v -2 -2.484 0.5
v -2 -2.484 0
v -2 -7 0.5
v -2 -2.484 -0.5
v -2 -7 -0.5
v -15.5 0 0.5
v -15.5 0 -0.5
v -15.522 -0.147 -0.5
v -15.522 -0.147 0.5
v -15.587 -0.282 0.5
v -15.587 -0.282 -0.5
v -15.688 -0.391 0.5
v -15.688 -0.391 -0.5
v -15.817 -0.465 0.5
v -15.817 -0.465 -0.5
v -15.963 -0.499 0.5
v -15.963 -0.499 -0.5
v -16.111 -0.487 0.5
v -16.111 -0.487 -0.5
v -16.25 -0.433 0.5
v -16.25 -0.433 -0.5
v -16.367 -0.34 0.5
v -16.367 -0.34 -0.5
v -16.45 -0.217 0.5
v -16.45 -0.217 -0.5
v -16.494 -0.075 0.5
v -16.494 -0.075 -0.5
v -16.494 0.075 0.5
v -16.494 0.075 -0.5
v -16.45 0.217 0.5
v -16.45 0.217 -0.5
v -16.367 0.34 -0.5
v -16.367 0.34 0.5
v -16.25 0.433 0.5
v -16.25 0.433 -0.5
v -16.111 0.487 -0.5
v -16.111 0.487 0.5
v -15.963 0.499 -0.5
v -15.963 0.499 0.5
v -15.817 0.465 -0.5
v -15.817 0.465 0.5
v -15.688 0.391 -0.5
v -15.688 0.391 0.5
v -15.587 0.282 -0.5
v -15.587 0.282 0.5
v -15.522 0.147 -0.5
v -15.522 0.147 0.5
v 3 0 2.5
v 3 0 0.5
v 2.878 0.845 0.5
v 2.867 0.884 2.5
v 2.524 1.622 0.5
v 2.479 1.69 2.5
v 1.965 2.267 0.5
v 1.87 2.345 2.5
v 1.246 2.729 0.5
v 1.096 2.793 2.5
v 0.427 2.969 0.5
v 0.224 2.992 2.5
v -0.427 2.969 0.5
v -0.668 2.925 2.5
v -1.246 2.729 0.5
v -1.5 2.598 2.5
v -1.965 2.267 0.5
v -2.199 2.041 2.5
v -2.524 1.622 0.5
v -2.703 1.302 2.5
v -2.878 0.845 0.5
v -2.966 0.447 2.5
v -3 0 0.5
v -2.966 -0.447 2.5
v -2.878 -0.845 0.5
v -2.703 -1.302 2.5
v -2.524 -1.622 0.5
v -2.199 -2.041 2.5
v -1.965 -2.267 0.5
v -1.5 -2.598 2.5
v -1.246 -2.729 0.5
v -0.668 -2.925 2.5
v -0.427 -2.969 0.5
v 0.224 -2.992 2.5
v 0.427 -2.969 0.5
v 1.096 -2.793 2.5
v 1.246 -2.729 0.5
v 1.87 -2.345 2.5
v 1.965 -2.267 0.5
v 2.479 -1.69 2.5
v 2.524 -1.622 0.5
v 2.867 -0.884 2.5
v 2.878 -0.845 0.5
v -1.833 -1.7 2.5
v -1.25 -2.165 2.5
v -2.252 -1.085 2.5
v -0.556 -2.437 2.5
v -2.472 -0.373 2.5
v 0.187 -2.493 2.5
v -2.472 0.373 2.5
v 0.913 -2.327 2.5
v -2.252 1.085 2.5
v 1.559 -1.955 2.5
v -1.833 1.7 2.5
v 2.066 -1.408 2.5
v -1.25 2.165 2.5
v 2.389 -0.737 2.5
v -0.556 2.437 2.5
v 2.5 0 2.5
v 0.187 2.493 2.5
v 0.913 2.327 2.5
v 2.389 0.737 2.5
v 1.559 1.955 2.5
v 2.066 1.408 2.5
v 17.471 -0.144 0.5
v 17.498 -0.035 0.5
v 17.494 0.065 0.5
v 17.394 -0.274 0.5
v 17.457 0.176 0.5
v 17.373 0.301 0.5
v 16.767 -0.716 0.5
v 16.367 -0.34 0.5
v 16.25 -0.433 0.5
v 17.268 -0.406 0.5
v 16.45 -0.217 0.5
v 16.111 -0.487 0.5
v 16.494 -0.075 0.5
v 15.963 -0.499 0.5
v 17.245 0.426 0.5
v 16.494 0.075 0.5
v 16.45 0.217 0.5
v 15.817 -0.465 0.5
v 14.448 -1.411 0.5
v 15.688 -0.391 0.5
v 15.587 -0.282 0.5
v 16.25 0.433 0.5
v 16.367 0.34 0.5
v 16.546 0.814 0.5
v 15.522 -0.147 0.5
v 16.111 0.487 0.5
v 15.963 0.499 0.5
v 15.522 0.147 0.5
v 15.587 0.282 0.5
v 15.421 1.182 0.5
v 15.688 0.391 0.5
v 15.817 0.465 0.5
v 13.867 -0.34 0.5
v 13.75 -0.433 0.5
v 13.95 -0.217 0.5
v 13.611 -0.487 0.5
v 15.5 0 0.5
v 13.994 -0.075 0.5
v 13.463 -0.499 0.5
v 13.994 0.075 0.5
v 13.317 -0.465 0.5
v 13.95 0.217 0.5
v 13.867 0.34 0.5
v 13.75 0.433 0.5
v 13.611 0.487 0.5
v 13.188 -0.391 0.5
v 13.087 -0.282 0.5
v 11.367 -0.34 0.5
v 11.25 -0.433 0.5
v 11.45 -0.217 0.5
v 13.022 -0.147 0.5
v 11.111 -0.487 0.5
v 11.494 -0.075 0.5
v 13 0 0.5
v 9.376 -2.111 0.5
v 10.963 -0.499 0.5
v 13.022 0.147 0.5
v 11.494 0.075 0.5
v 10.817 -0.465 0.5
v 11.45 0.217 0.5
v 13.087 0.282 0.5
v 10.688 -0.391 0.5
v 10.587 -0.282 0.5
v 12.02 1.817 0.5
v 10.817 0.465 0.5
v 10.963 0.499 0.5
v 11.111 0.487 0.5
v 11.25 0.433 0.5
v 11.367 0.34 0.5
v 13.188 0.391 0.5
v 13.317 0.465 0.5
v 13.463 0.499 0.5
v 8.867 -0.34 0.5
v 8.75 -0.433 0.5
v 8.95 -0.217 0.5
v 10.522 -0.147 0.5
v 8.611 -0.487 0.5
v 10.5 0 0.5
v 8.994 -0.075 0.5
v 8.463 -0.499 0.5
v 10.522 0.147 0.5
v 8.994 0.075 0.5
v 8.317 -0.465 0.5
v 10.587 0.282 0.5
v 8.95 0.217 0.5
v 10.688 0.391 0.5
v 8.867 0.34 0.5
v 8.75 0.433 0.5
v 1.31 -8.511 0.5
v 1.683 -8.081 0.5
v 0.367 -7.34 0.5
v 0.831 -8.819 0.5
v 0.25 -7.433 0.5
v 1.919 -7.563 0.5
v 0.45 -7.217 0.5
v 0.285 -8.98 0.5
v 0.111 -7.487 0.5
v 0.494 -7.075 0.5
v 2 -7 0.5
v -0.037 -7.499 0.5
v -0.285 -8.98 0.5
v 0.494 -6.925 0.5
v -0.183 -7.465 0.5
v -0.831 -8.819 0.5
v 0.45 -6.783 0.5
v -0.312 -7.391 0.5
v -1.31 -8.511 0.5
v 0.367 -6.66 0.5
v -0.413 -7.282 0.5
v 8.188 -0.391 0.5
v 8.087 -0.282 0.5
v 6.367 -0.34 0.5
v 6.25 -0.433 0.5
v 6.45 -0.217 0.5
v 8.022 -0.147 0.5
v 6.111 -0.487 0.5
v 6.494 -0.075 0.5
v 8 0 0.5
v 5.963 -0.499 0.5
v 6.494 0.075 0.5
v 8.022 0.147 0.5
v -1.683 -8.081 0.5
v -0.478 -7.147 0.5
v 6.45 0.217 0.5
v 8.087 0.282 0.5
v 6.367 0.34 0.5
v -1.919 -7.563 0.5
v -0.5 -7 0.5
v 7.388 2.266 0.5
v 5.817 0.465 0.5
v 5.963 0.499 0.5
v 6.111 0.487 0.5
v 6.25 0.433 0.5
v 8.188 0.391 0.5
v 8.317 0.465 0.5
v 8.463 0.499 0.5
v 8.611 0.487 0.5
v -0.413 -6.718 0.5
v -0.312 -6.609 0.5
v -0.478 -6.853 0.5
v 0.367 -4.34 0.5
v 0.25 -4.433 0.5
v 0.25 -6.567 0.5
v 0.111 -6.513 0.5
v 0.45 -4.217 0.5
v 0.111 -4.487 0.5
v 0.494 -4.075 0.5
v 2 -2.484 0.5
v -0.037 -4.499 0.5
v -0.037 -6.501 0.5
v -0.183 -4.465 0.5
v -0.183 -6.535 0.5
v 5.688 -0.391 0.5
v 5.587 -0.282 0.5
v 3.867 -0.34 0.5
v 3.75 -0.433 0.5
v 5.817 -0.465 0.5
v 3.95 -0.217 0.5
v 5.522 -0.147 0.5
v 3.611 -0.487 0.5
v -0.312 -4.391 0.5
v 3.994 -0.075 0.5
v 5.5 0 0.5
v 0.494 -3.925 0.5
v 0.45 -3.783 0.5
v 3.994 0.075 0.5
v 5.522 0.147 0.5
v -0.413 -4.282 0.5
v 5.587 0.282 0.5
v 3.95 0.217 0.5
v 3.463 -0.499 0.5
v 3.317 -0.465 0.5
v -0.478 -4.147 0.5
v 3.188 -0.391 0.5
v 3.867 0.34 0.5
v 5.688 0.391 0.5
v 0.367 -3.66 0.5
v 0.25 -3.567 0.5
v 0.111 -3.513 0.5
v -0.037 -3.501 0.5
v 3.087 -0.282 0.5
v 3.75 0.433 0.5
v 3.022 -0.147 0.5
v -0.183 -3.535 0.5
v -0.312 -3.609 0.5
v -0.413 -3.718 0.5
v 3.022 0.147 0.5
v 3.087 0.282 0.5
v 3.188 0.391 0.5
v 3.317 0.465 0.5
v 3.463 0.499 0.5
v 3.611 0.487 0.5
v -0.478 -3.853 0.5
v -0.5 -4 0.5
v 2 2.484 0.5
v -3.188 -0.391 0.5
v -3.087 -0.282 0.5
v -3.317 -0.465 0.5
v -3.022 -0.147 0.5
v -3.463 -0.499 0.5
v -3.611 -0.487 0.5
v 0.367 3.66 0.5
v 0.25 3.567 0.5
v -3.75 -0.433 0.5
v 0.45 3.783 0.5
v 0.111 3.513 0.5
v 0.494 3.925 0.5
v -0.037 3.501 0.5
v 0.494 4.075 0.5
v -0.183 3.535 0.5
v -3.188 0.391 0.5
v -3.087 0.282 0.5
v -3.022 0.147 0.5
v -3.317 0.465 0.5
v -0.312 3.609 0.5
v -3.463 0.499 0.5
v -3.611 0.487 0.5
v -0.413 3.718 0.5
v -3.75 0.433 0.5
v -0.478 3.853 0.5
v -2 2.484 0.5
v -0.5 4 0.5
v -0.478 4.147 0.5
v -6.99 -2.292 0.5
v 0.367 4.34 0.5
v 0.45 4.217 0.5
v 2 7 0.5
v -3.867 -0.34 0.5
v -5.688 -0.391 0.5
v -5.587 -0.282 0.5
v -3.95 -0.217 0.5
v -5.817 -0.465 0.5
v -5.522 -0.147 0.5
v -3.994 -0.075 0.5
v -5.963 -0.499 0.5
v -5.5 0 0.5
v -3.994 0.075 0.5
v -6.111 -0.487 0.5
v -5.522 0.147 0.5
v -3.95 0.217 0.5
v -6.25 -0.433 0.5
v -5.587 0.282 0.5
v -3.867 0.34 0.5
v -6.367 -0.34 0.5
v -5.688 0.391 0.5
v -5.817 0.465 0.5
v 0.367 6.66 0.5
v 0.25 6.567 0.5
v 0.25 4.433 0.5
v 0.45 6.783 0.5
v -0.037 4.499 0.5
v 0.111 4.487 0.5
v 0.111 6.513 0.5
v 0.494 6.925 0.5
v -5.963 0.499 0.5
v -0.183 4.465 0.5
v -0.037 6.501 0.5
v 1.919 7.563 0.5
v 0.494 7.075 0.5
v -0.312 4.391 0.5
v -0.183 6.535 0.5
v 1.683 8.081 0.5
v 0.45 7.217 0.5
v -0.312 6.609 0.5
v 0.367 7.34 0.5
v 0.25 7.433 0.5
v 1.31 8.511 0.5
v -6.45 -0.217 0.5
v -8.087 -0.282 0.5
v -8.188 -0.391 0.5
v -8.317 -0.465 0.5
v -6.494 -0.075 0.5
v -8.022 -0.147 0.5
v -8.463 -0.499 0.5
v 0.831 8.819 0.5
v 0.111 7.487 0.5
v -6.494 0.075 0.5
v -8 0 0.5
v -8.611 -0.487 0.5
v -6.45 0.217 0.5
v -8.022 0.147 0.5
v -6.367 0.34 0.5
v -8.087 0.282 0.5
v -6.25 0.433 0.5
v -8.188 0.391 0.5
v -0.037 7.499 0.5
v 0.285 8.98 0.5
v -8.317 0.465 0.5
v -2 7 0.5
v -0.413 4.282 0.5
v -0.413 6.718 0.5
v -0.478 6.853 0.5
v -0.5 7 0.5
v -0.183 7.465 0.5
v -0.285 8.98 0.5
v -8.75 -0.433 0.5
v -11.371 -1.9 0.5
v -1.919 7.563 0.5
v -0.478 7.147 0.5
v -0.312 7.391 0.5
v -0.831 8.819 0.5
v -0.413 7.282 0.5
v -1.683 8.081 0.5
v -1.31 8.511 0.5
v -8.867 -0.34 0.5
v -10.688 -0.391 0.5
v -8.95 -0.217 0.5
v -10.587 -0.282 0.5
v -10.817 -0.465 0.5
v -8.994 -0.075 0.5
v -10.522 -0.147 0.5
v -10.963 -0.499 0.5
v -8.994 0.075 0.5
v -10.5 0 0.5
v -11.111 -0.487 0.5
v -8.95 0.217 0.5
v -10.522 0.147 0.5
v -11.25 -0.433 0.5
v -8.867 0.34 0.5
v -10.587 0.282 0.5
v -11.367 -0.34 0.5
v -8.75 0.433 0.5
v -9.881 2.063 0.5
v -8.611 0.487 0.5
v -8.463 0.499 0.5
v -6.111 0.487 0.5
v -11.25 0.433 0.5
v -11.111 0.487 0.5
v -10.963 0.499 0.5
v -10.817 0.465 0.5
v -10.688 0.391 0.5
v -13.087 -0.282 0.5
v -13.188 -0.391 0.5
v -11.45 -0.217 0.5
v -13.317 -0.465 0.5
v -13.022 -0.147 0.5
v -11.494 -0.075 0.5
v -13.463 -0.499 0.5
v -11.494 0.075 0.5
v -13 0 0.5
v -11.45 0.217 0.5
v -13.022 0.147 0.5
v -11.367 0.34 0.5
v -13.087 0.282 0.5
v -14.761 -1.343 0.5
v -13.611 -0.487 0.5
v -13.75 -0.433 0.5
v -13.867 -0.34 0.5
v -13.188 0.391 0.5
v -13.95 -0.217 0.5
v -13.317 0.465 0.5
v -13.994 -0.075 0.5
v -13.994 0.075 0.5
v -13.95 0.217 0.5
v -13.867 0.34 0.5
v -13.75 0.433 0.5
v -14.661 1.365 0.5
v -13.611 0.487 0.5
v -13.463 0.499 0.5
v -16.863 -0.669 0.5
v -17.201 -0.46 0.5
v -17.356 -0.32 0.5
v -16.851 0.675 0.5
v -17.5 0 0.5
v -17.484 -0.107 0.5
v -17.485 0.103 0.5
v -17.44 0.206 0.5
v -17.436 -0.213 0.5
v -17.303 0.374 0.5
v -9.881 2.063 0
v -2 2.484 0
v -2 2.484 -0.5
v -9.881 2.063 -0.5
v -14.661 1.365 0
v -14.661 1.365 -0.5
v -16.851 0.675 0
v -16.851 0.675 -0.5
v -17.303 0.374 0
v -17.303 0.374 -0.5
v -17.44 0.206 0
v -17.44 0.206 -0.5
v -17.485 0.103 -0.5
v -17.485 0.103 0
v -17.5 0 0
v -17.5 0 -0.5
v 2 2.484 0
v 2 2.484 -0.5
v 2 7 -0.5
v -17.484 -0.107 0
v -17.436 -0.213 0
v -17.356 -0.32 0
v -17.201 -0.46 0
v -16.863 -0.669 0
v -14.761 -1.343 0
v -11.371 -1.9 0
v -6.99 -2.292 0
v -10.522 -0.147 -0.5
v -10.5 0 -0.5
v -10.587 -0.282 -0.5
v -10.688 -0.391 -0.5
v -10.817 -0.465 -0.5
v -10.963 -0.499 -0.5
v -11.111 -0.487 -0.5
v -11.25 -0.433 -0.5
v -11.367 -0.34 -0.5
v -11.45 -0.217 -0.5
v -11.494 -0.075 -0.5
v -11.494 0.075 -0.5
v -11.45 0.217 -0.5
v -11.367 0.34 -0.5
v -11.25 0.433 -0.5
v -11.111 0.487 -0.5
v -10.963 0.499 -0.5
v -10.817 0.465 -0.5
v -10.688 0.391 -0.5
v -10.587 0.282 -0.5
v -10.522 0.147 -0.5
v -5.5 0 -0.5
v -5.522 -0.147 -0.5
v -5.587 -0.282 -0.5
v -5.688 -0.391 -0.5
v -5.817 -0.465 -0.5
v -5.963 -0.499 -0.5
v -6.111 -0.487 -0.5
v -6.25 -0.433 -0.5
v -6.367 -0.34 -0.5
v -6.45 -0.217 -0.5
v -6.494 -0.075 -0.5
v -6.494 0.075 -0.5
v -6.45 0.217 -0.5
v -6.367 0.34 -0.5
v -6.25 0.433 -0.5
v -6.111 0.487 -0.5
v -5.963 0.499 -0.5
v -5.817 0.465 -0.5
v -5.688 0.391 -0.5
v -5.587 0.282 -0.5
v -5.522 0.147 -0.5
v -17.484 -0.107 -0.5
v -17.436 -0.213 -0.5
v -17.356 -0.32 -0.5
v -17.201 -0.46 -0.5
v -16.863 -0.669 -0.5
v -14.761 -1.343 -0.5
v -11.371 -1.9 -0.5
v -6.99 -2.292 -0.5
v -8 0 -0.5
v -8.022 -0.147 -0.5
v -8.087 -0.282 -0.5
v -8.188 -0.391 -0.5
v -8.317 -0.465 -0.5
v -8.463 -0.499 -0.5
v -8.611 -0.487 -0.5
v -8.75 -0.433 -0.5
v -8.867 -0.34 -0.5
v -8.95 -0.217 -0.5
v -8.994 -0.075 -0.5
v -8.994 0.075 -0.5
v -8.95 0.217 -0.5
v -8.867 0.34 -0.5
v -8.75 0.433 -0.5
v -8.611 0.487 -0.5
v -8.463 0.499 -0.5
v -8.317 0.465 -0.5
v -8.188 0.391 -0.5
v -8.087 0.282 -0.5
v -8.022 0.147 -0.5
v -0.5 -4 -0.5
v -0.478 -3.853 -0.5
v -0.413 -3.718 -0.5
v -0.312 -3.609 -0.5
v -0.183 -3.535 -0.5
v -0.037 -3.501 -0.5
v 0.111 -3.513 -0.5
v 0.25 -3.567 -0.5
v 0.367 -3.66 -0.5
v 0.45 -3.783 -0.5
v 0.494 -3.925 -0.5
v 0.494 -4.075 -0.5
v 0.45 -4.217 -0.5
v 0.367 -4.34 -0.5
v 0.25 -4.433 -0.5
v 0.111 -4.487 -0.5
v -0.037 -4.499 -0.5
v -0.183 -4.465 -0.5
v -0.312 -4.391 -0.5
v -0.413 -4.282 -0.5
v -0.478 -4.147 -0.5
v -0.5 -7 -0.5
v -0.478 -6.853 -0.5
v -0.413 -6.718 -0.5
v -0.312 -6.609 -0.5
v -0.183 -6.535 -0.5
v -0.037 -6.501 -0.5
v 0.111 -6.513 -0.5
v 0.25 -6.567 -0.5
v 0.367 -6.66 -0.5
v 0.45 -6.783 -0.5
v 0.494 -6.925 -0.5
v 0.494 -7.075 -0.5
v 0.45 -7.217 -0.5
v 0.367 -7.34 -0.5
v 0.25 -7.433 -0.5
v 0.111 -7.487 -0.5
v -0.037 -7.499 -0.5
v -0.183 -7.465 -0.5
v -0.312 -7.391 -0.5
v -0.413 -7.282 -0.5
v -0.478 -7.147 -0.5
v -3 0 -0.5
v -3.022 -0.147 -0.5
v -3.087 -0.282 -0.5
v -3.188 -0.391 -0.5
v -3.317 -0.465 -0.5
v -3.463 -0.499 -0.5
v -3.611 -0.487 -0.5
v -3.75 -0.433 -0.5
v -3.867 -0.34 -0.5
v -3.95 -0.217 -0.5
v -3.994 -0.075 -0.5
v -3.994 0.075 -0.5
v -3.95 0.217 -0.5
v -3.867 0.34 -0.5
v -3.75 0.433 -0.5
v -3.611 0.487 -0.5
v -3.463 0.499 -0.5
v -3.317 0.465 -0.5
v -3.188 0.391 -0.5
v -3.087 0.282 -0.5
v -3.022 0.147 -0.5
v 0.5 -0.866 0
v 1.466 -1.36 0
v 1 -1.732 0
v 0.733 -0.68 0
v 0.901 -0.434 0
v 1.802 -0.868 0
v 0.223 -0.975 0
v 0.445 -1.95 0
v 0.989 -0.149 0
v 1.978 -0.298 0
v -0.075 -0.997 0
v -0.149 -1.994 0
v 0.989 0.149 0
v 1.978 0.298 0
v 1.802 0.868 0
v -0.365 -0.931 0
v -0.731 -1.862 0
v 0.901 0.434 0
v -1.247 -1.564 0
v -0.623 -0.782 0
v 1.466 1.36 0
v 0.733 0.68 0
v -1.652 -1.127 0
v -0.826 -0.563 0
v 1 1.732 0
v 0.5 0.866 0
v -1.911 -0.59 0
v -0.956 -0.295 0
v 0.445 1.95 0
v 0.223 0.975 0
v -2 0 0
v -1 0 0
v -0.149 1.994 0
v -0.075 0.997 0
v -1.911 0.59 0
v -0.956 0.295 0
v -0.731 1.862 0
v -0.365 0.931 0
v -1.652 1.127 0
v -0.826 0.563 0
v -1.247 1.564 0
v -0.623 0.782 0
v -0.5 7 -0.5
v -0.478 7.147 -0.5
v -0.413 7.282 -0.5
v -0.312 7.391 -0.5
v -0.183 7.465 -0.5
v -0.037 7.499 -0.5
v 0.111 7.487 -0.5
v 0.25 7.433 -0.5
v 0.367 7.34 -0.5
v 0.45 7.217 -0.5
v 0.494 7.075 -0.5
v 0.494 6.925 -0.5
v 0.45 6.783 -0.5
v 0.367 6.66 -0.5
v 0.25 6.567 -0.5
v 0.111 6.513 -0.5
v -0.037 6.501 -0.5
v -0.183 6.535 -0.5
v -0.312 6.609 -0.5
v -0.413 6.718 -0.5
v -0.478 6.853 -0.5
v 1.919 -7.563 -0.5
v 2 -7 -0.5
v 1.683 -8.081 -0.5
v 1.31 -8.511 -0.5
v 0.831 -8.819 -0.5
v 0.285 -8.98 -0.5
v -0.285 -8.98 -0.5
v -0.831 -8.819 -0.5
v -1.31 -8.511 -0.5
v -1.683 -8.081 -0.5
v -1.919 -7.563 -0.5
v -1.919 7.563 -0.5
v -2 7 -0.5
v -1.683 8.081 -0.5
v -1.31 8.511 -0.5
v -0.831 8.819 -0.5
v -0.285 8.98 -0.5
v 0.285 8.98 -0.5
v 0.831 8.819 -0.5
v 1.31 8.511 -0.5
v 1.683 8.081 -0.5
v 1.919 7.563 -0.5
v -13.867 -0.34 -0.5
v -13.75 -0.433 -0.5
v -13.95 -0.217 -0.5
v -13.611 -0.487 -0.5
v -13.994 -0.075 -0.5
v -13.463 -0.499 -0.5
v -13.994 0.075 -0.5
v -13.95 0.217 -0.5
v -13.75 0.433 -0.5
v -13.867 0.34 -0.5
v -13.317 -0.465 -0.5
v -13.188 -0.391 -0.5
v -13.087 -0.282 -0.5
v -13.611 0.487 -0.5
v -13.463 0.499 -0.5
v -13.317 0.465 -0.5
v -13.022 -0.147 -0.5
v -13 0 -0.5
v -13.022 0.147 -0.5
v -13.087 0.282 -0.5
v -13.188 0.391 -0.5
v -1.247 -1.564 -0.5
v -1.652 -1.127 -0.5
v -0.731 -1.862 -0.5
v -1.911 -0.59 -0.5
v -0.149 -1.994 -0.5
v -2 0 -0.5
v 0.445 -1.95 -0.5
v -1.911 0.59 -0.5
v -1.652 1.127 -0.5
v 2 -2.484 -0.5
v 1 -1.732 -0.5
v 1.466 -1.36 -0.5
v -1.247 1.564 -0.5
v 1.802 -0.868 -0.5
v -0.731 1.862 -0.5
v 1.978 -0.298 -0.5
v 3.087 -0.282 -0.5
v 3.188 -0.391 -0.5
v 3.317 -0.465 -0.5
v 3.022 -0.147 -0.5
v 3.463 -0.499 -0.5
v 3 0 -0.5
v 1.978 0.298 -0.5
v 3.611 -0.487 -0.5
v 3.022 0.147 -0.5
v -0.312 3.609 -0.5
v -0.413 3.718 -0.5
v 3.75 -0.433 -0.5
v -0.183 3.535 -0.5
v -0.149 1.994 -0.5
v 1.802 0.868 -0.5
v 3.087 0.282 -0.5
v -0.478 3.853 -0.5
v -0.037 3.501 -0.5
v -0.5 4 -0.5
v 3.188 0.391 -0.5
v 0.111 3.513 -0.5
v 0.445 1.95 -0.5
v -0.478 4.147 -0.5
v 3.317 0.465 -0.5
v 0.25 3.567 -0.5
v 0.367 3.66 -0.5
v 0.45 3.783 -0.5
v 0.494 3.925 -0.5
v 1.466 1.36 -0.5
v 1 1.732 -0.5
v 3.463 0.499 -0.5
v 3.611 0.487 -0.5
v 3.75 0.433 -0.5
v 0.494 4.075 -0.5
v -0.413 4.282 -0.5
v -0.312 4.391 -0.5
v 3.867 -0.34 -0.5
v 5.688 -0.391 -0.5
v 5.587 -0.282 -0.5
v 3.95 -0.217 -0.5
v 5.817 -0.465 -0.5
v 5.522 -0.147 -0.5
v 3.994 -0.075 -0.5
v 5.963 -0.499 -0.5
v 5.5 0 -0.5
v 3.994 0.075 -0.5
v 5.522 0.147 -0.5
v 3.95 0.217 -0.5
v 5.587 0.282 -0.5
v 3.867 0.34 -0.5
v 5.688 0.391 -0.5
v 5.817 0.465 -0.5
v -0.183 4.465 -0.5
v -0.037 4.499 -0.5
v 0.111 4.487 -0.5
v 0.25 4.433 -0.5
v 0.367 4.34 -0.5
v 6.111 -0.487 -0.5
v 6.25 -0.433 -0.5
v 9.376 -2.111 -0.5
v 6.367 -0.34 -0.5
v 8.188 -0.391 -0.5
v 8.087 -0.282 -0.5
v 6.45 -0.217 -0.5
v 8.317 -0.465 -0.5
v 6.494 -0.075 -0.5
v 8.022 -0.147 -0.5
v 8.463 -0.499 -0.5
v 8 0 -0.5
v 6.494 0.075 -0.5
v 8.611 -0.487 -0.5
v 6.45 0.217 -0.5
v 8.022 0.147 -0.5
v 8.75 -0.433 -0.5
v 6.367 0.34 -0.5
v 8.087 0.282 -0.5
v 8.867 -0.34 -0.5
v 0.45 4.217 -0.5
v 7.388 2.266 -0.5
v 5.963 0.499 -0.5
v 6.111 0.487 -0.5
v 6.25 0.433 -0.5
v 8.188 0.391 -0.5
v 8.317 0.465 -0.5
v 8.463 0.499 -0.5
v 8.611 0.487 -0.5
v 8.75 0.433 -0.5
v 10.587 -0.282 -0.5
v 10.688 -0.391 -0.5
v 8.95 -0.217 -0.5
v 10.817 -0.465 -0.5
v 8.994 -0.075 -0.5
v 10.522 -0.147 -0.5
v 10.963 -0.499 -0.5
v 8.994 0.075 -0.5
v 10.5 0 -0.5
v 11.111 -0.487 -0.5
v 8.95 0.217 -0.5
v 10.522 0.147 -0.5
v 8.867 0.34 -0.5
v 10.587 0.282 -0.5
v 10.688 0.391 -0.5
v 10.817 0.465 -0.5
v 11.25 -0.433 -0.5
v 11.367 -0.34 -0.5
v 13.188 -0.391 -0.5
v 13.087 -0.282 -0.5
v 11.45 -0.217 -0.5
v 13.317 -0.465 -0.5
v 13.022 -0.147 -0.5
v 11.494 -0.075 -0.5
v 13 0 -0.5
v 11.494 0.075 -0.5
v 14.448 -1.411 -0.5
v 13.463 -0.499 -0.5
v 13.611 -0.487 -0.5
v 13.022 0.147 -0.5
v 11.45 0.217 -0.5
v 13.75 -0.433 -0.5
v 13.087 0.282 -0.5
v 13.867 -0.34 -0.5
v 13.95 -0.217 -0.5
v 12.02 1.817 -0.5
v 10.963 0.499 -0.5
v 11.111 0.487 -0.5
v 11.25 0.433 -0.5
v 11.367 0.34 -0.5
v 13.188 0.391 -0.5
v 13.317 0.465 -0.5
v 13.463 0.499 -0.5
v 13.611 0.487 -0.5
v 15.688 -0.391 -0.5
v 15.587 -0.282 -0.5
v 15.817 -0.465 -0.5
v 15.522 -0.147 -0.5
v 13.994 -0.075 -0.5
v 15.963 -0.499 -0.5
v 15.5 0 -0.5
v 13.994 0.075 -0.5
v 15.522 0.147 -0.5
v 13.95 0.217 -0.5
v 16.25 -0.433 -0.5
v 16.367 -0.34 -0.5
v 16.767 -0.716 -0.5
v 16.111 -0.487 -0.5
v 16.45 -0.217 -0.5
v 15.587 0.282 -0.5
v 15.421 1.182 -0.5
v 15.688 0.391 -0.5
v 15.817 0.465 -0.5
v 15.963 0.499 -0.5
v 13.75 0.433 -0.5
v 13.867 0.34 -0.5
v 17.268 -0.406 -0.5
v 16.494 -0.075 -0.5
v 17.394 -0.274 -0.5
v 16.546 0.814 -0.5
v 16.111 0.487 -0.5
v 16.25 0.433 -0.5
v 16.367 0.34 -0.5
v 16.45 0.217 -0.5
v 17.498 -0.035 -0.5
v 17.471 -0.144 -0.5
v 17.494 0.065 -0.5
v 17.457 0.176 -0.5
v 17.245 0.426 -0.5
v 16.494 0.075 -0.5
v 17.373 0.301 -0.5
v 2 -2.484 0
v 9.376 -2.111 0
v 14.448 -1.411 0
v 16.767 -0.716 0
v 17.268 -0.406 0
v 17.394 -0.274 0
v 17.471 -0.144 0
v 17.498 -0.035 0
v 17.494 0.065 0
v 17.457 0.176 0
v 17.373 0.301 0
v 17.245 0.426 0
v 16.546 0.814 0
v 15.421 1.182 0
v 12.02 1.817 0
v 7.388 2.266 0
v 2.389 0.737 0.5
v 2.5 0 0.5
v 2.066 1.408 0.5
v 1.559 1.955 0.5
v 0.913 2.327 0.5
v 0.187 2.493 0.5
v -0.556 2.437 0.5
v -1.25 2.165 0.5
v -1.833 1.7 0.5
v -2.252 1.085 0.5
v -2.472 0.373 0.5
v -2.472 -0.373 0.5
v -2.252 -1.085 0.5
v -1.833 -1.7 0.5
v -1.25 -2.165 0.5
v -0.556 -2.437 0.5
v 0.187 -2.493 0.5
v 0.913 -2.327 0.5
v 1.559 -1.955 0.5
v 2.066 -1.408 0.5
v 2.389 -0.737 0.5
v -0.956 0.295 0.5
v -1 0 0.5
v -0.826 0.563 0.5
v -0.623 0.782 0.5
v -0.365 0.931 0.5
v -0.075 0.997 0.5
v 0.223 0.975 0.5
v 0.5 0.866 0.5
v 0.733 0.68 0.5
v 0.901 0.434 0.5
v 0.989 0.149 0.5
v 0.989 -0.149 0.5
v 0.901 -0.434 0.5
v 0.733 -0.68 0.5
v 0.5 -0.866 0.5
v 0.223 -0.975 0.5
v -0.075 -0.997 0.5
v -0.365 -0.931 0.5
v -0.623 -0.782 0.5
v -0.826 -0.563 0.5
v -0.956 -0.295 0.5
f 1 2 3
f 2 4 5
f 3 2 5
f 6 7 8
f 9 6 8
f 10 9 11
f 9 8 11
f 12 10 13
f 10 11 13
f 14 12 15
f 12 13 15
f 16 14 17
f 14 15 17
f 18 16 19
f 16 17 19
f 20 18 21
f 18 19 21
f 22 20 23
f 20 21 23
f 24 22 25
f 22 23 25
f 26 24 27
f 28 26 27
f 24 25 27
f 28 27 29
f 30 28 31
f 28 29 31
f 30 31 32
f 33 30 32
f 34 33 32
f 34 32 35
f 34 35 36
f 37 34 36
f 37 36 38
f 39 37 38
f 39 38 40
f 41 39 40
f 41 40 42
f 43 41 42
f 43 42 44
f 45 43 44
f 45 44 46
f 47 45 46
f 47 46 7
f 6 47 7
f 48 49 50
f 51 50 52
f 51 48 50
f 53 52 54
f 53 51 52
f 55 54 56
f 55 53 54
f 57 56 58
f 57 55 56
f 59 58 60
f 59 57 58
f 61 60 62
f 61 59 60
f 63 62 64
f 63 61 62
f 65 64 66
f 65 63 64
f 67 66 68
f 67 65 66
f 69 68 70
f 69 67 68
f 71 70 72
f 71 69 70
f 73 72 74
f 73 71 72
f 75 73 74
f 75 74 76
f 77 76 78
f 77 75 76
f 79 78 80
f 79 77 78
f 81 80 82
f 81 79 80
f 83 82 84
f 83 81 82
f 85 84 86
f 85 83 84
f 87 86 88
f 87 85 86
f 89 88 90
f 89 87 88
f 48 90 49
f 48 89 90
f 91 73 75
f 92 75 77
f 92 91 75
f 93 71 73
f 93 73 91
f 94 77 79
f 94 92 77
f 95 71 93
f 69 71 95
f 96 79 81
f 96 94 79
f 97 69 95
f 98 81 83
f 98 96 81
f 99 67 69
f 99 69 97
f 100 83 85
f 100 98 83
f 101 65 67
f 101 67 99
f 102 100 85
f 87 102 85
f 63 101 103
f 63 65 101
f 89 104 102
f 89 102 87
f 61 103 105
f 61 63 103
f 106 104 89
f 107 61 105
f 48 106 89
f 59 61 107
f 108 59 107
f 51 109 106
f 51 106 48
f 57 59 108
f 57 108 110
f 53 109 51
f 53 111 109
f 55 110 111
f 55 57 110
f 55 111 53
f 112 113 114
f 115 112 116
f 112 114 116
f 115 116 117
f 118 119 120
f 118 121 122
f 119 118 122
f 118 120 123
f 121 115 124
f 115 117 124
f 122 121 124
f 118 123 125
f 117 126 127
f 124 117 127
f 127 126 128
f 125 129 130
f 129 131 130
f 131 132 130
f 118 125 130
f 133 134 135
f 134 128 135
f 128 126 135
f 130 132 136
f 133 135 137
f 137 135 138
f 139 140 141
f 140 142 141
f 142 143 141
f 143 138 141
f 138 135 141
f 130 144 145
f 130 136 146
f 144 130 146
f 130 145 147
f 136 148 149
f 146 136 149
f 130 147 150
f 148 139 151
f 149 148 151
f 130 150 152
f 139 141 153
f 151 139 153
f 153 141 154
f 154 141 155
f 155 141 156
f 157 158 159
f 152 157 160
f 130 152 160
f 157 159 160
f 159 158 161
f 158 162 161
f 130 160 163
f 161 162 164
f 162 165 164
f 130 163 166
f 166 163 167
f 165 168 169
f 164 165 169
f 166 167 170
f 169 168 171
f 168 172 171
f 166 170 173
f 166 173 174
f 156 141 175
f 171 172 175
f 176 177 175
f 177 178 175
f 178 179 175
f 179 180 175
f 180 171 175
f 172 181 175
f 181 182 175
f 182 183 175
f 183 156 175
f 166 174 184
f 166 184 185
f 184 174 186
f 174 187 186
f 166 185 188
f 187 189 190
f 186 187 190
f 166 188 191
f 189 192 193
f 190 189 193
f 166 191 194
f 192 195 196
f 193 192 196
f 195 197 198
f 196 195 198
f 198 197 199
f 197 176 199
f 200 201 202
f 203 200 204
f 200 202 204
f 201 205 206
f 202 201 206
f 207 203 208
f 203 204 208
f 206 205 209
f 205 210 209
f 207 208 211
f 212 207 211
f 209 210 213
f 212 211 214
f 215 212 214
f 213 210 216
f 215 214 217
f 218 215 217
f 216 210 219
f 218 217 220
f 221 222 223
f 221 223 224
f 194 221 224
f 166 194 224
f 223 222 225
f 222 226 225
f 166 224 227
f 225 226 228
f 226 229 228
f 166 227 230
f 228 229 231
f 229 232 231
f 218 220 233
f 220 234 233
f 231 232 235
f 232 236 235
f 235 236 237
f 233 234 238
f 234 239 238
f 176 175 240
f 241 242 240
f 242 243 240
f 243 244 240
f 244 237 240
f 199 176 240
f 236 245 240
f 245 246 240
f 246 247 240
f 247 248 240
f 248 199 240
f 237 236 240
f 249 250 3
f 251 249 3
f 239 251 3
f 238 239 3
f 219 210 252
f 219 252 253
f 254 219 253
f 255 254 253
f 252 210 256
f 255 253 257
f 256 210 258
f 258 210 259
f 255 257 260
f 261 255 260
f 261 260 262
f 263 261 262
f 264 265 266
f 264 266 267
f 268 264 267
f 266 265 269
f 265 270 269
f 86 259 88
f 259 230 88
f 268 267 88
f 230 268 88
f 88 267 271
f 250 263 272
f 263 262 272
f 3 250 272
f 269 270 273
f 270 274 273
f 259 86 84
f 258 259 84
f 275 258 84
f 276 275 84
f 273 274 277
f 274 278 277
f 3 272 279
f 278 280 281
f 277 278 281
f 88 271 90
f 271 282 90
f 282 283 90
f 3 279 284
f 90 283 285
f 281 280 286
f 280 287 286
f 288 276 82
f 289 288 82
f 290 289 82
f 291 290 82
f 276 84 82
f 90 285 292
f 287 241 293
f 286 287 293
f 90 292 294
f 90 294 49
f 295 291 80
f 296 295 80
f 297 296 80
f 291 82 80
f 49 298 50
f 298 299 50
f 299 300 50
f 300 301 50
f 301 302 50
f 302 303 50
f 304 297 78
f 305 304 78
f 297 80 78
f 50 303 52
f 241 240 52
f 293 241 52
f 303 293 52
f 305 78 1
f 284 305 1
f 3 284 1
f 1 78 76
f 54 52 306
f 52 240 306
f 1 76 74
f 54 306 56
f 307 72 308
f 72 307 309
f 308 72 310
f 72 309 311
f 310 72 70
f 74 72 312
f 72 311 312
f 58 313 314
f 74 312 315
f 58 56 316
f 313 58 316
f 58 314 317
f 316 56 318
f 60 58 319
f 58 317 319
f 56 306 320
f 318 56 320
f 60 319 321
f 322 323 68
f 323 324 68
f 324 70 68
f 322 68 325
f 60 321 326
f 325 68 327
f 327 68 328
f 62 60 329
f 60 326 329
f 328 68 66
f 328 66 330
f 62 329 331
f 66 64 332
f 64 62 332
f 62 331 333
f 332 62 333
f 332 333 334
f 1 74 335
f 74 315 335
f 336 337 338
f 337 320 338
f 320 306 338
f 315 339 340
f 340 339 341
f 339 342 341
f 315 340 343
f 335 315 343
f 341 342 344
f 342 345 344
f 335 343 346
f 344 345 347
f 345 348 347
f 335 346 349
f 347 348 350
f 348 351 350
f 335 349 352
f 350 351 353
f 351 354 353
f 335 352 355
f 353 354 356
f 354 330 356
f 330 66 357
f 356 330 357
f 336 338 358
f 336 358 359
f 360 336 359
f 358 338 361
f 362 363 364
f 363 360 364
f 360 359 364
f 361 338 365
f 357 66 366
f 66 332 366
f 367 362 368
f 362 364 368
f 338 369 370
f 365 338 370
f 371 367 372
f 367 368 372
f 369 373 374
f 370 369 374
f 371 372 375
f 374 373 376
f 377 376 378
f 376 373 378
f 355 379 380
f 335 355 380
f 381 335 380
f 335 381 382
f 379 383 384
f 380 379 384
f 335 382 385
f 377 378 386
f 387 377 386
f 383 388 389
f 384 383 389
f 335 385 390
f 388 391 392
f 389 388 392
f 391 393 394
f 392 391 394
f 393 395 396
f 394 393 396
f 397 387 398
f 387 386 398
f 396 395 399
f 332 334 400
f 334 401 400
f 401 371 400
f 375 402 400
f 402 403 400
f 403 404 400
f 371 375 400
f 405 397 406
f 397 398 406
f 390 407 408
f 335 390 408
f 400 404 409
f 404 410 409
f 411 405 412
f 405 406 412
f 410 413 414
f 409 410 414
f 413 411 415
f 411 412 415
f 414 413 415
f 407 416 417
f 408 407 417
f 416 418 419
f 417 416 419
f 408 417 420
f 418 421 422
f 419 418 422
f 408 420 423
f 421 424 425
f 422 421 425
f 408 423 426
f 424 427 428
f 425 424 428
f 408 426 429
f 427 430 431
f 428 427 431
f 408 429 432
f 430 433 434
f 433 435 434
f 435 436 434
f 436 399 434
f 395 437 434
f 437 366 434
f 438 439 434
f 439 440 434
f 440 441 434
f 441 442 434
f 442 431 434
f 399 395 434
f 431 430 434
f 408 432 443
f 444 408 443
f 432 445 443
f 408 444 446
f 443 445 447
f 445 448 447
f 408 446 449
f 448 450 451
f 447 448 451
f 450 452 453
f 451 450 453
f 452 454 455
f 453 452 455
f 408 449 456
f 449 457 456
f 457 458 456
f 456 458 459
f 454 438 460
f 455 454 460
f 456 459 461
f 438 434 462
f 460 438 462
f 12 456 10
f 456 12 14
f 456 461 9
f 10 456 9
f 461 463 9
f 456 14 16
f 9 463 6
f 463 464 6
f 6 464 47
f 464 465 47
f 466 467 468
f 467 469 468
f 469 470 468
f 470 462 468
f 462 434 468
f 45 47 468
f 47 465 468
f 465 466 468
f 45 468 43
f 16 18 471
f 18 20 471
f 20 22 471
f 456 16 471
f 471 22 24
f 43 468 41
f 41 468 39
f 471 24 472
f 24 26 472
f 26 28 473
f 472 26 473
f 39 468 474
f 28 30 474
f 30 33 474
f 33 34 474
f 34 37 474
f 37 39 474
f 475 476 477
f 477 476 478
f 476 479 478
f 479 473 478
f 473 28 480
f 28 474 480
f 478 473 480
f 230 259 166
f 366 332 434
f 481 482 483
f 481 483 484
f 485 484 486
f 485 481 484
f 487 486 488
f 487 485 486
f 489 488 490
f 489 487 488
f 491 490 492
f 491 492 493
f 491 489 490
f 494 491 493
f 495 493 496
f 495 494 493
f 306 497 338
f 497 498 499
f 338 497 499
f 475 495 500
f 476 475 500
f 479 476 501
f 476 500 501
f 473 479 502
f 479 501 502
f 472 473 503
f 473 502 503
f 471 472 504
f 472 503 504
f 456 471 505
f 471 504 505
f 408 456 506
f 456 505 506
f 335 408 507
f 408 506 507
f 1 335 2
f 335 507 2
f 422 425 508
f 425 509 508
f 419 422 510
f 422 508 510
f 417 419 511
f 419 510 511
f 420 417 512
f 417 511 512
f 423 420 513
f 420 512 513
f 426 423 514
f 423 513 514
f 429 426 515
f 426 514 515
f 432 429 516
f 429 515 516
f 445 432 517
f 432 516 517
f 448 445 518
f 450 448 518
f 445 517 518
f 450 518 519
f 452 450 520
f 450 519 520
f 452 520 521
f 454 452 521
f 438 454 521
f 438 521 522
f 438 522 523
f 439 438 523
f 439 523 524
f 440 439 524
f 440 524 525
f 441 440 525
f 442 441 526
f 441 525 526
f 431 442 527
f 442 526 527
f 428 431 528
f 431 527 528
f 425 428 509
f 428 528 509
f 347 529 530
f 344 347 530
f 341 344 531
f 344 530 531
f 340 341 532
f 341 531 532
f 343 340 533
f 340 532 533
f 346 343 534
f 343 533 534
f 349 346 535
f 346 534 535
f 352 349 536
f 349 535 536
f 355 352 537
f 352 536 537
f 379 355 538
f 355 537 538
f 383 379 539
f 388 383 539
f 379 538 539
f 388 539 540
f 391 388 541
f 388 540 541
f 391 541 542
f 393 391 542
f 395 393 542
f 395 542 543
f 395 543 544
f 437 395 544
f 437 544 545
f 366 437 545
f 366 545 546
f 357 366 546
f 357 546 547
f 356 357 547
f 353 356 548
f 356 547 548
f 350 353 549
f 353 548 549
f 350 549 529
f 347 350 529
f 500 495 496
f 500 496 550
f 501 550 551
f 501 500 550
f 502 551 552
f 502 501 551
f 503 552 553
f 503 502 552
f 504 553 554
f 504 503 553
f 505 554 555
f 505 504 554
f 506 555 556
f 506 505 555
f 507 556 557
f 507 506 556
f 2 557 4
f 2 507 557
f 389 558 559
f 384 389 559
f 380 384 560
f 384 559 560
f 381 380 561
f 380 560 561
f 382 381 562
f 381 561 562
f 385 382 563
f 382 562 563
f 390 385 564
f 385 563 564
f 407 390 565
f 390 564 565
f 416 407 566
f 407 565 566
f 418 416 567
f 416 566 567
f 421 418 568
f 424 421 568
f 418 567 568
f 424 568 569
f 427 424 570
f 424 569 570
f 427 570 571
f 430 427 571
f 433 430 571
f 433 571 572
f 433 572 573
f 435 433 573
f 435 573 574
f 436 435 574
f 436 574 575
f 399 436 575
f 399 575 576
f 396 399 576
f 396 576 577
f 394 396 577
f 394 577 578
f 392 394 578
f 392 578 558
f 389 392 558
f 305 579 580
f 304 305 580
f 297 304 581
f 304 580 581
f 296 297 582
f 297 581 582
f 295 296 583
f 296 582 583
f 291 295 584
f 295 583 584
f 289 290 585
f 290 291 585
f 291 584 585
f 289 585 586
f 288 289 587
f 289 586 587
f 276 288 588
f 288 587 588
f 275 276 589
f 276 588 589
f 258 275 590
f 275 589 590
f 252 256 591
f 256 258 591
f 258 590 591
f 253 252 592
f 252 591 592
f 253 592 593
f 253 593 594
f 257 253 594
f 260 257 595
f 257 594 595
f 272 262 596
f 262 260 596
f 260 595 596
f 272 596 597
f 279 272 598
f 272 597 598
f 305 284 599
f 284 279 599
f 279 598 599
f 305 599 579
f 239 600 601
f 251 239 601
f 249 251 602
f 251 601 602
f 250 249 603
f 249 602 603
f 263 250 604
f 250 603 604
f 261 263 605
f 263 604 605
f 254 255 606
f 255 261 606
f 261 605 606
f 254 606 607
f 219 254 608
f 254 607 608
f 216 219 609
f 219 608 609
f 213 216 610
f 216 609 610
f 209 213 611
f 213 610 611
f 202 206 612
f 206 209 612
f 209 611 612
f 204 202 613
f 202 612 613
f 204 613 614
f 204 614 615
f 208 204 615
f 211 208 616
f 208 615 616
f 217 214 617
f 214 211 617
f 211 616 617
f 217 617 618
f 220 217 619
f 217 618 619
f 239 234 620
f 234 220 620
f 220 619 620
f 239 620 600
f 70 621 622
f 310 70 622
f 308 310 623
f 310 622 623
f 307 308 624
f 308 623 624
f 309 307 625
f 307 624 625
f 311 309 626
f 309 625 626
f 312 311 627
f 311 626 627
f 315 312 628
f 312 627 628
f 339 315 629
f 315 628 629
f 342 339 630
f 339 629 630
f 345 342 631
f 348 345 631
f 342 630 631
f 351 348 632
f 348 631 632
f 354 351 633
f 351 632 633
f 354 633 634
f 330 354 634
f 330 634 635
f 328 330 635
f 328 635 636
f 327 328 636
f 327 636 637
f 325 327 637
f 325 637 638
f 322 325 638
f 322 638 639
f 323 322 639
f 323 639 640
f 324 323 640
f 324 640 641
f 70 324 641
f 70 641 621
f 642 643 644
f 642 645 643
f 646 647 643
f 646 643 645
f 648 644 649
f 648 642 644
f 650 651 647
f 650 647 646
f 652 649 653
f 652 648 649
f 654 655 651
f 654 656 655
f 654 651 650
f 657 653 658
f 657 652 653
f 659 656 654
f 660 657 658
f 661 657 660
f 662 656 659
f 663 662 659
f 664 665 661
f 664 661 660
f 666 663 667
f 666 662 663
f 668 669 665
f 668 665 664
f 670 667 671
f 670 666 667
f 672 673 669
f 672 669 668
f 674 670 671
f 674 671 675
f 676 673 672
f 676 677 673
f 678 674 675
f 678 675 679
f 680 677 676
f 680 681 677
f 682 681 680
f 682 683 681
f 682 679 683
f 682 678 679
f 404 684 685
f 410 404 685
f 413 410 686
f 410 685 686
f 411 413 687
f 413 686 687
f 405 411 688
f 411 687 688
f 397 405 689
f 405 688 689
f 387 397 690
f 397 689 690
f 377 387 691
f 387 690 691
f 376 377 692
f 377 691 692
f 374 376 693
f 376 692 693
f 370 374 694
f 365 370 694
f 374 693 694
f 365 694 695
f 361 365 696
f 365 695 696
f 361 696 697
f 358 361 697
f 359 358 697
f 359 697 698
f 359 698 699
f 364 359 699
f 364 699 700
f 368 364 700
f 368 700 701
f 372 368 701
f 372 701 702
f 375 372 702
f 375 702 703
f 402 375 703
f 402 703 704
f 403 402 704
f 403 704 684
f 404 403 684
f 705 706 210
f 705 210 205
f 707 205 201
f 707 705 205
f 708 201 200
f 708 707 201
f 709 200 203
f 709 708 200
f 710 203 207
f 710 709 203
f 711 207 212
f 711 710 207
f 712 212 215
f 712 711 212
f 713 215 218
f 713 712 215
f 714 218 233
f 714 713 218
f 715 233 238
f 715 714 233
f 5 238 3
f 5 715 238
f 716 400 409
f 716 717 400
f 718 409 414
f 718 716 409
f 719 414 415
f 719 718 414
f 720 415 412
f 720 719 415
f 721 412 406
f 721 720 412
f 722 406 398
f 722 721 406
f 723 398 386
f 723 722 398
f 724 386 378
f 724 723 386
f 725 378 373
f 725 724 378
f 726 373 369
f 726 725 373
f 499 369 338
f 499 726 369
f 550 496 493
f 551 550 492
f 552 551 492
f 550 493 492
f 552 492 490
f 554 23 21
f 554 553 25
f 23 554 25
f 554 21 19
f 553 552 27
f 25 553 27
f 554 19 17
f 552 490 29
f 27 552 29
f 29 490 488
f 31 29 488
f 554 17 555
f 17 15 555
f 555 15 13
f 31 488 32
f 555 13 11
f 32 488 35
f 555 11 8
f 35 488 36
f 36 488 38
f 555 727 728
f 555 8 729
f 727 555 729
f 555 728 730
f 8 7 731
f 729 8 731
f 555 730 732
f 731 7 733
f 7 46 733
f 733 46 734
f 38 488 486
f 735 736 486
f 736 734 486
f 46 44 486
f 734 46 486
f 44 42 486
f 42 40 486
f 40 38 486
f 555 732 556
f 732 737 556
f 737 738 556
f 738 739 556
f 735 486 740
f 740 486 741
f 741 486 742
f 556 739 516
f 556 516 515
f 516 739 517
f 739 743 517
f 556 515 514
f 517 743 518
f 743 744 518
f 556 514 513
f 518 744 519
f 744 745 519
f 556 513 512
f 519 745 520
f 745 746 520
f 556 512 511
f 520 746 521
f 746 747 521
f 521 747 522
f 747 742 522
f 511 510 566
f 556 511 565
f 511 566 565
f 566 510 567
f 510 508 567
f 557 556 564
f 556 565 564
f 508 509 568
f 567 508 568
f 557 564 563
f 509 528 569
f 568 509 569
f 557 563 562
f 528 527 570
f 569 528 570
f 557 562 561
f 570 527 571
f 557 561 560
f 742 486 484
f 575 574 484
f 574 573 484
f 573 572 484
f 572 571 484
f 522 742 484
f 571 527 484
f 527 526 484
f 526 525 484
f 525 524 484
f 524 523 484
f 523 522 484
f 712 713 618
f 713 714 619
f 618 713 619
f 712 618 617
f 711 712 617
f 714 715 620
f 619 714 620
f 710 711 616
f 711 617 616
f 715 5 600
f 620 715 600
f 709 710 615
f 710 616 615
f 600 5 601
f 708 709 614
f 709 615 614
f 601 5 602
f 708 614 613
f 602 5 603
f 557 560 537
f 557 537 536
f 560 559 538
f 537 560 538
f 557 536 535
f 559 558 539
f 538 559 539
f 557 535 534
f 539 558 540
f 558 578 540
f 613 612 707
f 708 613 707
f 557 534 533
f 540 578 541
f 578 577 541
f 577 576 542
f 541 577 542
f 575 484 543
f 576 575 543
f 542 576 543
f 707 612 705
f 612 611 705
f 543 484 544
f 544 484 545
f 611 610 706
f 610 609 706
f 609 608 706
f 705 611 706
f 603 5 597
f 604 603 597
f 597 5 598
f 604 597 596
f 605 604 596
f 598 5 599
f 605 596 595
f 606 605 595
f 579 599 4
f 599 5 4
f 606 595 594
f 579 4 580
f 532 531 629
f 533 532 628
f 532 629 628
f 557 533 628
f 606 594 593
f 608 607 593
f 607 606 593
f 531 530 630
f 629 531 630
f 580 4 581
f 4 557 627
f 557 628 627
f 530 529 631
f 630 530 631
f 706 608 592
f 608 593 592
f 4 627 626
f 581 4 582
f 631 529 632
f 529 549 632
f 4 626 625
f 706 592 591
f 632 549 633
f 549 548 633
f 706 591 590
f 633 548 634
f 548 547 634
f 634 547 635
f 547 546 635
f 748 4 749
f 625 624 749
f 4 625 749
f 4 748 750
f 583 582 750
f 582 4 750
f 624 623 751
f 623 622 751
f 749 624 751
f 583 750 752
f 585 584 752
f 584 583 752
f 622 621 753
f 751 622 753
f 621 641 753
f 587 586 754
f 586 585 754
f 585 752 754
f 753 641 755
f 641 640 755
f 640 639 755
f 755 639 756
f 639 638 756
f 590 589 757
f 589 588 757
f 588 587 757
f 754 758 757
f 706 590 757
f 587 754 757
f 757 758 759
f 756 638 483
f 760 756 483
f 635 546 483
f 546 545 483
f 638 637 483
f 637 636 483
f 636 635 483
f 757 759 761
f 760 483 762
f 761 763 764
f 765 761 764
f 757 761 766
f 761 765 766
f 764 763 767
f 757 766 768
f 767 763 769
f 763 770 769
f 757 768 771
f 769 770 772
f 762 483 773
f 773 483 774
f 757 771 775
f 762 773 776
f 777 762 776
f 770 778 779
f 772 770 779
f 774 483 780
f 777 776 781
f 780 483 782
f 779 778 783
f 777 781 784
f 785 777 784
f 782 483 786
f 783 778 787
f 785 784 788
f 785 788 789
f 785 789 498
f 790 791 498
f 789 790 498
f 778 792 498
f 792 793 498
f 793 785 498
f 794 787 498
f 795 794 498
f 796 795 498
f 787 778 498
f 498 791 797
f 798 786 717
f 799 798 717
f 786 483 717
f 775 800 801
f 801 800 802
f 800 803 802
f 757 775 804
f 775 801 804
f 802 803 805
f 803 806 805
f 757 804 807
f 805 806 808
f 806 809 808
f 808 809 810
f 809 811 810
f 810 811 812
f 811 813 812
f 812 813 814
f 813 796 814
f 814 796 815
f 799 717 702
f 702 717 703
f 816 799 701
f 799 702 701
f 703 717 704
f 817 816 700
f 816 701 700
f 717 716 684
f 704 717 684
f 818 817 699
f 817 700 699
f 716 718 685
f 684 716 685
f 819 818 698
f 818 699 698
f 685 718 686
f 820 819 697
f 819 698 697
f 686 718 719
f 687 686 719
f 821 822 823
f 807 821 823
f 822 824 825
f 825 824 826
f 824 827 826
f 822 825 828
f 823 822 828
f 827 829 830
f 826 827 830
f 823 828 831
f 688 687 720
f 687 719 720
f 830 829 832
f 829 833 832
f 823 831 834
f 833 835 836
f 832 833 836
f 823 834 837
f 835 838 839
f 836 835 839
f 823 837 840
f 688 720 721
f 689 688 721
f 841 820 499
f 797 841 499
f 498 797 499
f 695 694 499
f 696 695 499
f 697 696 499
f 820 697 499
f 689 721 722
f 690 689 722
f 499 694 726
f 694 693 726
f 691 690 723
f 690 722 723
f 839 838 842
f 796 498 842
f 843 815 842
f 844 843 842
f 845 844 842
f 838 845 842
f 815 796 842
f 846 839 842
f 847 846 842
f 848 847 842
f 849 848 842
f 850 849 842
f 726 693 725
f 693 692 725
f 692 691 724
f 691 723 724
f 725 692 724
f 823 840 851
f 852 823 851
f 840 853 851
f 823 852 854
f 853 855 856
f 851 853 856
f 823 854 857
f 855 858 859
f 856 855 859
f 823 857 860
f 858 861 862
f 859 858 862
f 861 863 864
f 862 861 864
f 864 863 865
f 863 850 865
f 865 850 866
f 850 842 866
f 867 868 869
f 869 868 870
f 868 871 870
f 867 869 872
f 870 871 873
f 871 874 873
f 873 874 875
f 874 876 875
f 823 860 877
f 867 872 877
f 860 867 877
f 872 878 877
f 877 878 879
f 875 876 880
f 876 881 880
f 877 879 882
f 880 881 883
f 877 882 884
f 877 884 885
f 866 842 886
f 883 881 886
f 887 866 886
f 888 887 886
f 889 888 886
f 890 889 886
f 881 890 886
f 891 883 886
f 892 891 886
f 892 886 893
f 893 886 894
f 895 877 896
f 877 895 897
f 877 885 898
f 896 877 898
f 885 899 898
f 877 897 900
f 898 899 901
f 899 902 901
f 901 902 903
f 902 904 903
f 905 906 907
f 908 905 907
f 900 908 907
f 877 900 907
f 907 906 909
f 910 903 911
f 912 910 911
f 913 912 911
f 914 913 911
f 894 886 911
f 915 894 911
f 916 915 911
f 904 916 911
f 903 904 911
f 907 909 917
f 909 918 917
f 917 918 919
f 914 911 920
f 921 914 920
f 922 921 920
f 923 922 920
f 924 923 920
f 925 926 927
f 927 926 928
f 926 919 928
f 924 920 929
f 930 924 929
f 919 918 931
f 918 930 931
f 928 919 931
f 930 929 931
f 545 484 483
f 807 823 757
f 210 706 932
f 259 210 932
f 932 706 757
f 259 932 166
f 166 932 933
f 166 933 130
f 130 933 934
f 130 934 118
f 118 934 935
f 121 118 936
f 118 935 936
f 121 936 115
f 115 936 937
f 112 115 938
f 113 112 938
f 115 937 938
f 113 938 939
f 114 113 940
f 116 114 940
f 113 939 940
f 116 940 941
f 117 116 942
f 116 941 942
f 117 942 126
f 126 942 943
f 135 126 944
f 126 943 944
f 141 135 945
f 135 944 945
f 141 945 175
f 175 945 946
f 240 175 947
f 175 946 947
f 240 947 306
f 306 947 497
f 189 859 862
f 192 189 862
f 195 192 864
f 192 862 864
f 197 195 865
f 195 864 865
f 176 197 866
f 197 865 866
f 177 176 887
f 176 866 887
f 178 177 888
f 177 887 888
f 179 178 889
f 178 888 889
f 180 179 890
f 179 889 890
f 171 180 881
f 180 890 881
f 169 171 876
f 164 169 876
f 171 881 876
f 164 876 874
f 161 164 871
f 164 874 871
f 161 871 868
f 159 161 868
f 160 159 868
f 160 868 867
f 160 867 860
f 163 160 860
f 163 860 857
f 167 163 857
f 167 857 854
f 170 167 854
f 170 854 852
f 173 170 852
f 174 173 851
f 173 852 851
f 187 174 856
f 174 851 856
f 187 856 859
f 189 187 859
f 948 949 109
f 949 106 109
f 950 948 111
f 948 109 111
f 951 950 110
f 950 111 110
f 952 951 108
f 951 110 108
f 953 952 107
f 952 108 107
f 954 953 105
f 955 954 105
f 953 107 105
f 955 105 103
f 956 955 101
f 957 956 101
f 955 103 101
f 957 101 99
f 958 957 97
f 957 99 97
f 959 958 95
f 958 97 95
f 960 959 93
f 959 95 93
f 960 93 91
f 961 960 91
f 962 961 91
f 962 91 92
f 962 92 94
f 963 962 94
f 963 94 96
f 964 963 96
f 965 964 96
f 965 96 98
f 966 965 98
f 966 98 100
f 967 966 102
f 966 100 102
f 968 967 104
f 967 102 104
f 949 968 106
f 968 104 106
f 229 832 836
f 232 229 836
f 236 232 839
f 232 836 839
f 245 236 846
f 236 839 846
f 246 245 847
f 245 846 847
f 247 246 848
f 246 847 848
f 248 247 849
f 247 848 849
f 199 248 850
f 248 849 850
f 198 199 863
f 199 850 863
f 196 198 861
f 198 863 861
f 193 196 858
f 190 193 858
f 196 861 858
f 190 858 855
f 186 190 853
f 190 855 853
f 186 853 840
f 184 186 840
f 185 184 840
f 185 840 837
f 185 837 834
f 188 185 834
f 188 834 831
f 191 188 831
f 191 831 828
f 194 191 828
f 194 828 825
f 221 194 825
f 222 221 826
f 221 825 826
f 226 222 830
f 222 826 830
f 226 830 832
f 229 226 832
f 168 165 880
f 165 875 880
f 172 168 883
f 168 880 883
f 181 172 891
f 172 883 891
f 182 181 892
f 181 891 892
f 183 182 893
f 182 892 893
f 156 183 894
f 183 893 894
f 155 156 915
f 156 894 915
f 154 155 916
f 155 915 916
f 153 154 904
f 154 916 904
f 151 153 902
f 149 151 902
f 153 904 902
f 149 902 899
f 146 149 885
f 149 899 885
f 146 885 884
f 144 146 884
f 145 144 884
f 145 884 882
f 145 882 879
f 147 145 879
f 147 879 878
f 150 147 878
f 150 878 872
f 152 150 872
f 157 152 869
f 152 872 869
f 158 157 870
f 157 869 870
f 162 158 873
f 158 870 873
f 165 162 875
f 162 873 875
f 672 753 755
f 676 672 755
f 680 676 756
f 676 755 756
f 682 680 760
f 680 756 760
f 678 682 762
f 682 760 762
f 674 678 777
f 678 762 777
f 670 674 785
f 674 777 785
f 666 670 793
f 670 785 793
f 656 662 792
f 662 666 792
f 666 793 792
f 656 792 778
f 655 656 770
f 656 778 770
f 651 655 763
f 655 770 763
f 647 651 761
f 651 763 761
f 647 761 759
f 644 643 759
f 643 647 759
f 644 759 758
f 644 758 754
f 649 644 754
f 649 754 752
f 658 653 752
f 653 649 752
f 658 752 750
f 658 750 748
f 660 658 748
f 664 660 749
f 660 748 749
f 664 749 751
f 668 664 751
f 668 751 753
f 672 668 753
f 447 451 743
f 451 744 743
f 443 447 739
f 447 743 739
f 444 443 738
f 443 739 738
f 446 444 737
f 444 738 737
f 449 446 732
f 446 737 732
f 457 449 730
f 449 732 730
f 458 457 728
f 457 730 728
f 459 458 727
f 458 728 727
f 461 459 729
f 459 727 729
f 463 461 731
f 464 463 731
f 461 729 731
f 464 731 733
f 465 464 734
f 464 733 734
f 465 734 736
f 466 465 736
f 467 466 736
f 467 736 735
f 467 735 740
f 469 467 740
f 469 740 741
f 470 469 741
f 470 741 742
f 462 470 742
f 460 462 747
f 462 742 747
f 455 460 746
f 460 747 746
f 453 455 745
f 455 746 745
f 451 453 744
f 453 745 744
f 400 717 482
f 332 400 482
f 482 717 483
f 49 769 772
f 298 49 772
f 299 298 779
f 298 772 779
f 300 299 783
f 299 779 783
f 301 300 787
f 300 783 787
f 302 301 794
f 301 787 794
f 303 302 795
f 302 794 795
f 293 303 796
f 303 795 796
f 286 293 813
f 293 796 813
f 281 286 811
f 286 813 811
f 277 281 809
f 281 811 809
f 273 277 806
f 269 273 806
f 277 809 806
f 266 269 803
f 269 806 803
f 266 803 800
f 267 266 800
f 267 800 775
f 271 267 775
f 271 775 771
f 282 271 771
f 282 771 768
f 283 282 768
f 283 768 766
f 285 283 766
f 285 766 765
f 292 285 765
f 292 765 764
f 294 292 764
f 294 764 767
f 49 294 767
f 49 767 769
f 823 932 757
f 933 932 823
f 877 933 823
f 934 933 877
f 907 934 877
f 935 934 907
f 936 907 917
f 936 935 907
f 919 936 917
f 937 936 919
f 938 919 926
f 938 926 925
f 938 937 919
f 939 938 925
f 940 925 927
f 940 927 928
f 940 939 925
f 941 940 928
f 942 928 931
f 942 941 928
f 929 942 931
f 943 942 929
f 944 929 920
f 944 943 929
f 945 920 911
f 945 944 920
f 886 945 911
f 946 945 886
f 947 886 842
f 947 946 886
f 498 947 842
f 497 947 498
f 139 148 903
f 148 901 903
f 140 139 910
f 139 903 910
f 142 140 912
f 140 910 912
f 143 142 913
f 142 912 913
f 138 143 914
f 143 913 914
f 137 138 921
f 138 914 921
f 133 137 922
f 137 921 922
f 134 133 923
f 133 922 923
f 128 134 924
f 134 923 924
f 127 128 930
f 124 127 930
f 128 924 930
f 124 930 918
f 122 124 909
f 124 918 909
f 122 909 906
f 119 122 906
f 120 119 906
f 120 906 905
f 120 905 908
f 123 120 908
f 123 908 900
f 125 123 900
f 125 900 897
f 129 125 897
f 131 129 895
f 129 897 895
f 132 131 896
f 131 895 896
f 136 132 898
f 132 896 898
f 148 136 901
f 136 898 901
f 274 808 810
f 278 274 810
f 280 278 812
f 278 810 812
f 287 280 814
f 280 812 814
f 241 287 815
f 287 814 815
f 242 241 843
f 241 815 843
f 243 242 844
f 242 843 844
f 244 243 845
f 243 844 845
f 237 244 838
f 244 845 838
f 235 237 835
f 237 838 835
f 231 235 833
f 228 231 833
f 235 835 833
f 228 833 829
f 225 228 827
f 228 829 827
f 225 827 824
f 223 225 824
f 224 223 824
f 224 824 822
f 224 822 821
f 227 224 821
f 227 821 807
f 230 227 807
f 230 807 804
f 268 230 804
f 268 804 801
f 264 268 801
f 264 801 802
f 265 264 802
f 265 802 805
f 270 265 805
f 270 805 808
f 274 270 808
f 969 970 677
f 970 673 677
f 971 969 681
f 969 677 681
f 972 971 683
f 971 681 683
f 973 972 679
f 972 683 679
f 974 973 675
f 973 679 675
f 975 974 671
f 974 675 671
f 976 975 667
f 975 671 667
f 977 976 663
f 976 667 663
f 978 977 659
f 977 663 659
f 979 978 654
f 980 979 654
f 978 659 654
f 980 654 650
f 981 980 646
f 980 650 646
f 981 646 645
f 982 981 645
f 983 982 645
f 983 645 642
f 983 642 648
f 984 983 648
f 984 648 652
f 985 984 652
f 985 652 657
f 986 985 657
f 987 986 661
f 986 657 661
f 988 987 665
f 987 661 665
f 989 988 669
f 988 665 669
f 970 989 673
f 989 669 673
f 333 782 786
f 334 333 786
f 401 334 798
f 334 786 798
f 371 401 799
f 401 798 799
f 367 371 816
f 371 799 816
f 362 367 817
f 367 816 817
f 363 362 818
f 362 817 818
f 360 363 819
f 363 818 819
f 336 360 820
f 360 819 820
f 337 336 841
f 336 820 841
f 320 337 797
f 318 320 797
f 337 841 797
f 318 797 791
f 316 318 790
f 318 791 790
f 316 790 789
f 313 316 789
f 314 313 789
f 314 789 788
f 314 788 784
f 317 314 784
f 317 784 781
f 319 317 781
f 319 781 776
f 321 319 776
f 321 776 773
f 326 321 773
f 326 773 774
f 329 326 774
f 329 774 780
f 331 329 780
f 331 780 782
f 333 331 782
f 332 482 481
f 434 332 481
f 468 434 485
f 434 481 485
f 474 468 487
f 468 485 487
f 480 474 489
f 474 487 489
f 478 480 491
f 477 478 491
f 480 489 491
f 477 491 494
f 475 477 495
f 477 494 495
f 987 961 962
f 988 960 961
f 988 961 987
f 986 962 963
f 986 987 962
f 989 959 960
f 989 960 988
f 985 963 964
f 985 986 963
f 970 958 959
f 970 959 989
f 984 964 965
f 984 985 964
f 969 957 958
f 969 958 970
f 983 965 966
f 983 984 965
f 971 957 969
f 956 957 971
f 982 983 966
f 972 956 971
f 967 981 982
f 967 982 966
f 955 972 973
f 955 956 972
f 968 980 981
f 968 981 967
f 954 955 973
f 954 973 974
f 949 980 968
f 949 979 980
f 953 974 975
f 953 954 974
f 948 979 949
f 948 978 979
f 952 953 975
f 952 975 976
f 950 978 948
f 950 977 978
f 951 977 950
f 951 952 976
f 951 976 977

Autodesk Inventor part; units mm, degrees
ref_plane "YZ Plane" through (0, 0, 0) normal (1, 0, 0) x (0, 1, 0)
ref_plane "XZ Plane" through (0, 0, 0) normal (0, 1, 0) x (-1, 0, 0)
ref_plane "XY Plane" through (0, 0, 0) normal (0, 0, 1) x (1, 0, 0)
sketch "Sketch1" plane through (0, 0, 0) normal (0, 0, 1) x (1, 0, 0)
  ellipse E0 centre (0, 0) end of major axis (-17.5, 0) minor radius 2.5
  line L0 (0, 0) -> (0, -2.5)
  dimension "d0" = 17.5
  dimension "d1" = 2.5
extrude "Extrusion1" add sketch "Sketch1" along normal mid plane 1
sketch "Sketch2" plane through (0, 0, 0.5) normal (0, 0, 1) x (1, 0, 0)
  ellipse E0 centre (0, 0) end of major axis (17.5, 0) minor radius 2.5 projected
  circle A0 centre (0, 0) radius 3
  dimension "d4" = 6
extrude "Extrusion2" add sketch "Sketch2" along normal blind 2 and the other way blind 1 contours A0 E0 | E0 A0 | A0 E0 picked at (1.5591, 0) picked at (0.3978, 2.6587) picked at (0.3978, -2.6587)
sketch "Sketch3" plane through (0, 0, 2.5) normal (0, 0, 1) x (1, 0, 0)
  circle A0 centre (0, 0) radius 3 projected
  circle A1 centre (0, 0) radius 2.5
  dimension "d7" = 5
extrude "Extrusion3" cut sketch "Sketch3" against normal blind 2 contours A1
sketch "Sketch4" plane through (0, 0, -0.5) normal (0, 0, -1) x (-1, 0, 0)
  ellipse E0 centre (0, 0) end of major axis (-17.5, 0) minor radius 2.5 projected
  circle A0 centre (0, 0) radius 2
  dimension "d10" = 4
extrude "Extrusion4" cut sketch "Sketch4" against normal blind 0.5 contours A0
sketch "Sketch5" plane through (0, 0, 0) normal (0, 0, -1) x (-1, 0, 0)
  circle A0 centre (0, 0) radius 2 projected
  circle A1 centre (0, 0) radius 1
  dimension "d13" = 2
extrude "Extrusion5" cut sketch "Sketch5" against normal through all contours A1
sketch "Sketch6" plane through (0, 0, -0.5) normal (0, 0, -1) x (-1, 0, 0)
  ellipse E0 centre (0, 0) end of major axis (-17.5, 0) minor radius 2.5 projected
  circle A0 centre (-16, 0) radius 0.5
  line L0 (0, 0) -> (0, -1.2687)
  line L1 (0, 0) -> (-1.4808, 0)
  dimension "d16" = 1
  dimension "d17" = 16
extrude "Extrusion6" cut sketch "Sketch6" against normal through all contours A0
pattern_linear "Rectangular Pattern1" count 6 spacing 2.5 along (-1, 0, 0) of "Extrusion6"
mirror "Mirror2" about plane through (0, 0, 0) normal (1, 0, 0) of "Extrusion6", "Rectangular Pattern1"
sketch "Sketch7" plane through (0, 0, -0.5) normal (0, 0, -1) x (-1, 0, 0)
  circle A0 centre (0, 0) radius 2 projected
  arc A1 (1.6755, 2.4885) -> (-1.6755, 2.4885) centre (0, 0) ccw projected
  line L0 (2, -7) -> (-2, -7)
  line L1 (-2, -7) -> (-2, 7)
  line L2 (-2, 7) -> (2, 7)
  line L3 (2, 7) -> (2, -7)
  line L4 (0, 0) -> (0, 1.4793)
  line L5 (0, 0) -> (-1.001, 0)
  circle A2 centre (0, 7) radius 2
  circle A3 centre (0, -7) radius 2
  circle A4 centre (0, 0) radius 2
  point P0 (2, 0)
  dimension "d25" = 4
  dimension "d26" = 14
extrude "Extrusion7" add sketch "Sketch7" against normal blind 1 contours L3 A3 L1 A0 | A0 L1 A2 L3 | A2 L2 | L2 A2 | A3 L0 | L0 A3
sketch "Sketch8" plane through (0, 0, -0.5) normal (0, 0, -1) x (-1, 0, 0)
  arc A0 (2, 7) -> (-2, 7) centre (0, 7) ccw projected
  circle A1 centre (0, 7) radius 0.5
  dimension "d29" = 1
extrude "Extrusion8" cut sketch "Sketch8" against normal blind 1
pattern_linear "Rectangular Pattern2" count 2 spacing 3 along (0, -1, 0) of "Extrusion8"
mirror "Mirror3" about plane through (0, 0, 0) normal (0, 1, 0) of "Extrusion8", "Rectangular Pattern2"
properties material "PVC-Piping"
